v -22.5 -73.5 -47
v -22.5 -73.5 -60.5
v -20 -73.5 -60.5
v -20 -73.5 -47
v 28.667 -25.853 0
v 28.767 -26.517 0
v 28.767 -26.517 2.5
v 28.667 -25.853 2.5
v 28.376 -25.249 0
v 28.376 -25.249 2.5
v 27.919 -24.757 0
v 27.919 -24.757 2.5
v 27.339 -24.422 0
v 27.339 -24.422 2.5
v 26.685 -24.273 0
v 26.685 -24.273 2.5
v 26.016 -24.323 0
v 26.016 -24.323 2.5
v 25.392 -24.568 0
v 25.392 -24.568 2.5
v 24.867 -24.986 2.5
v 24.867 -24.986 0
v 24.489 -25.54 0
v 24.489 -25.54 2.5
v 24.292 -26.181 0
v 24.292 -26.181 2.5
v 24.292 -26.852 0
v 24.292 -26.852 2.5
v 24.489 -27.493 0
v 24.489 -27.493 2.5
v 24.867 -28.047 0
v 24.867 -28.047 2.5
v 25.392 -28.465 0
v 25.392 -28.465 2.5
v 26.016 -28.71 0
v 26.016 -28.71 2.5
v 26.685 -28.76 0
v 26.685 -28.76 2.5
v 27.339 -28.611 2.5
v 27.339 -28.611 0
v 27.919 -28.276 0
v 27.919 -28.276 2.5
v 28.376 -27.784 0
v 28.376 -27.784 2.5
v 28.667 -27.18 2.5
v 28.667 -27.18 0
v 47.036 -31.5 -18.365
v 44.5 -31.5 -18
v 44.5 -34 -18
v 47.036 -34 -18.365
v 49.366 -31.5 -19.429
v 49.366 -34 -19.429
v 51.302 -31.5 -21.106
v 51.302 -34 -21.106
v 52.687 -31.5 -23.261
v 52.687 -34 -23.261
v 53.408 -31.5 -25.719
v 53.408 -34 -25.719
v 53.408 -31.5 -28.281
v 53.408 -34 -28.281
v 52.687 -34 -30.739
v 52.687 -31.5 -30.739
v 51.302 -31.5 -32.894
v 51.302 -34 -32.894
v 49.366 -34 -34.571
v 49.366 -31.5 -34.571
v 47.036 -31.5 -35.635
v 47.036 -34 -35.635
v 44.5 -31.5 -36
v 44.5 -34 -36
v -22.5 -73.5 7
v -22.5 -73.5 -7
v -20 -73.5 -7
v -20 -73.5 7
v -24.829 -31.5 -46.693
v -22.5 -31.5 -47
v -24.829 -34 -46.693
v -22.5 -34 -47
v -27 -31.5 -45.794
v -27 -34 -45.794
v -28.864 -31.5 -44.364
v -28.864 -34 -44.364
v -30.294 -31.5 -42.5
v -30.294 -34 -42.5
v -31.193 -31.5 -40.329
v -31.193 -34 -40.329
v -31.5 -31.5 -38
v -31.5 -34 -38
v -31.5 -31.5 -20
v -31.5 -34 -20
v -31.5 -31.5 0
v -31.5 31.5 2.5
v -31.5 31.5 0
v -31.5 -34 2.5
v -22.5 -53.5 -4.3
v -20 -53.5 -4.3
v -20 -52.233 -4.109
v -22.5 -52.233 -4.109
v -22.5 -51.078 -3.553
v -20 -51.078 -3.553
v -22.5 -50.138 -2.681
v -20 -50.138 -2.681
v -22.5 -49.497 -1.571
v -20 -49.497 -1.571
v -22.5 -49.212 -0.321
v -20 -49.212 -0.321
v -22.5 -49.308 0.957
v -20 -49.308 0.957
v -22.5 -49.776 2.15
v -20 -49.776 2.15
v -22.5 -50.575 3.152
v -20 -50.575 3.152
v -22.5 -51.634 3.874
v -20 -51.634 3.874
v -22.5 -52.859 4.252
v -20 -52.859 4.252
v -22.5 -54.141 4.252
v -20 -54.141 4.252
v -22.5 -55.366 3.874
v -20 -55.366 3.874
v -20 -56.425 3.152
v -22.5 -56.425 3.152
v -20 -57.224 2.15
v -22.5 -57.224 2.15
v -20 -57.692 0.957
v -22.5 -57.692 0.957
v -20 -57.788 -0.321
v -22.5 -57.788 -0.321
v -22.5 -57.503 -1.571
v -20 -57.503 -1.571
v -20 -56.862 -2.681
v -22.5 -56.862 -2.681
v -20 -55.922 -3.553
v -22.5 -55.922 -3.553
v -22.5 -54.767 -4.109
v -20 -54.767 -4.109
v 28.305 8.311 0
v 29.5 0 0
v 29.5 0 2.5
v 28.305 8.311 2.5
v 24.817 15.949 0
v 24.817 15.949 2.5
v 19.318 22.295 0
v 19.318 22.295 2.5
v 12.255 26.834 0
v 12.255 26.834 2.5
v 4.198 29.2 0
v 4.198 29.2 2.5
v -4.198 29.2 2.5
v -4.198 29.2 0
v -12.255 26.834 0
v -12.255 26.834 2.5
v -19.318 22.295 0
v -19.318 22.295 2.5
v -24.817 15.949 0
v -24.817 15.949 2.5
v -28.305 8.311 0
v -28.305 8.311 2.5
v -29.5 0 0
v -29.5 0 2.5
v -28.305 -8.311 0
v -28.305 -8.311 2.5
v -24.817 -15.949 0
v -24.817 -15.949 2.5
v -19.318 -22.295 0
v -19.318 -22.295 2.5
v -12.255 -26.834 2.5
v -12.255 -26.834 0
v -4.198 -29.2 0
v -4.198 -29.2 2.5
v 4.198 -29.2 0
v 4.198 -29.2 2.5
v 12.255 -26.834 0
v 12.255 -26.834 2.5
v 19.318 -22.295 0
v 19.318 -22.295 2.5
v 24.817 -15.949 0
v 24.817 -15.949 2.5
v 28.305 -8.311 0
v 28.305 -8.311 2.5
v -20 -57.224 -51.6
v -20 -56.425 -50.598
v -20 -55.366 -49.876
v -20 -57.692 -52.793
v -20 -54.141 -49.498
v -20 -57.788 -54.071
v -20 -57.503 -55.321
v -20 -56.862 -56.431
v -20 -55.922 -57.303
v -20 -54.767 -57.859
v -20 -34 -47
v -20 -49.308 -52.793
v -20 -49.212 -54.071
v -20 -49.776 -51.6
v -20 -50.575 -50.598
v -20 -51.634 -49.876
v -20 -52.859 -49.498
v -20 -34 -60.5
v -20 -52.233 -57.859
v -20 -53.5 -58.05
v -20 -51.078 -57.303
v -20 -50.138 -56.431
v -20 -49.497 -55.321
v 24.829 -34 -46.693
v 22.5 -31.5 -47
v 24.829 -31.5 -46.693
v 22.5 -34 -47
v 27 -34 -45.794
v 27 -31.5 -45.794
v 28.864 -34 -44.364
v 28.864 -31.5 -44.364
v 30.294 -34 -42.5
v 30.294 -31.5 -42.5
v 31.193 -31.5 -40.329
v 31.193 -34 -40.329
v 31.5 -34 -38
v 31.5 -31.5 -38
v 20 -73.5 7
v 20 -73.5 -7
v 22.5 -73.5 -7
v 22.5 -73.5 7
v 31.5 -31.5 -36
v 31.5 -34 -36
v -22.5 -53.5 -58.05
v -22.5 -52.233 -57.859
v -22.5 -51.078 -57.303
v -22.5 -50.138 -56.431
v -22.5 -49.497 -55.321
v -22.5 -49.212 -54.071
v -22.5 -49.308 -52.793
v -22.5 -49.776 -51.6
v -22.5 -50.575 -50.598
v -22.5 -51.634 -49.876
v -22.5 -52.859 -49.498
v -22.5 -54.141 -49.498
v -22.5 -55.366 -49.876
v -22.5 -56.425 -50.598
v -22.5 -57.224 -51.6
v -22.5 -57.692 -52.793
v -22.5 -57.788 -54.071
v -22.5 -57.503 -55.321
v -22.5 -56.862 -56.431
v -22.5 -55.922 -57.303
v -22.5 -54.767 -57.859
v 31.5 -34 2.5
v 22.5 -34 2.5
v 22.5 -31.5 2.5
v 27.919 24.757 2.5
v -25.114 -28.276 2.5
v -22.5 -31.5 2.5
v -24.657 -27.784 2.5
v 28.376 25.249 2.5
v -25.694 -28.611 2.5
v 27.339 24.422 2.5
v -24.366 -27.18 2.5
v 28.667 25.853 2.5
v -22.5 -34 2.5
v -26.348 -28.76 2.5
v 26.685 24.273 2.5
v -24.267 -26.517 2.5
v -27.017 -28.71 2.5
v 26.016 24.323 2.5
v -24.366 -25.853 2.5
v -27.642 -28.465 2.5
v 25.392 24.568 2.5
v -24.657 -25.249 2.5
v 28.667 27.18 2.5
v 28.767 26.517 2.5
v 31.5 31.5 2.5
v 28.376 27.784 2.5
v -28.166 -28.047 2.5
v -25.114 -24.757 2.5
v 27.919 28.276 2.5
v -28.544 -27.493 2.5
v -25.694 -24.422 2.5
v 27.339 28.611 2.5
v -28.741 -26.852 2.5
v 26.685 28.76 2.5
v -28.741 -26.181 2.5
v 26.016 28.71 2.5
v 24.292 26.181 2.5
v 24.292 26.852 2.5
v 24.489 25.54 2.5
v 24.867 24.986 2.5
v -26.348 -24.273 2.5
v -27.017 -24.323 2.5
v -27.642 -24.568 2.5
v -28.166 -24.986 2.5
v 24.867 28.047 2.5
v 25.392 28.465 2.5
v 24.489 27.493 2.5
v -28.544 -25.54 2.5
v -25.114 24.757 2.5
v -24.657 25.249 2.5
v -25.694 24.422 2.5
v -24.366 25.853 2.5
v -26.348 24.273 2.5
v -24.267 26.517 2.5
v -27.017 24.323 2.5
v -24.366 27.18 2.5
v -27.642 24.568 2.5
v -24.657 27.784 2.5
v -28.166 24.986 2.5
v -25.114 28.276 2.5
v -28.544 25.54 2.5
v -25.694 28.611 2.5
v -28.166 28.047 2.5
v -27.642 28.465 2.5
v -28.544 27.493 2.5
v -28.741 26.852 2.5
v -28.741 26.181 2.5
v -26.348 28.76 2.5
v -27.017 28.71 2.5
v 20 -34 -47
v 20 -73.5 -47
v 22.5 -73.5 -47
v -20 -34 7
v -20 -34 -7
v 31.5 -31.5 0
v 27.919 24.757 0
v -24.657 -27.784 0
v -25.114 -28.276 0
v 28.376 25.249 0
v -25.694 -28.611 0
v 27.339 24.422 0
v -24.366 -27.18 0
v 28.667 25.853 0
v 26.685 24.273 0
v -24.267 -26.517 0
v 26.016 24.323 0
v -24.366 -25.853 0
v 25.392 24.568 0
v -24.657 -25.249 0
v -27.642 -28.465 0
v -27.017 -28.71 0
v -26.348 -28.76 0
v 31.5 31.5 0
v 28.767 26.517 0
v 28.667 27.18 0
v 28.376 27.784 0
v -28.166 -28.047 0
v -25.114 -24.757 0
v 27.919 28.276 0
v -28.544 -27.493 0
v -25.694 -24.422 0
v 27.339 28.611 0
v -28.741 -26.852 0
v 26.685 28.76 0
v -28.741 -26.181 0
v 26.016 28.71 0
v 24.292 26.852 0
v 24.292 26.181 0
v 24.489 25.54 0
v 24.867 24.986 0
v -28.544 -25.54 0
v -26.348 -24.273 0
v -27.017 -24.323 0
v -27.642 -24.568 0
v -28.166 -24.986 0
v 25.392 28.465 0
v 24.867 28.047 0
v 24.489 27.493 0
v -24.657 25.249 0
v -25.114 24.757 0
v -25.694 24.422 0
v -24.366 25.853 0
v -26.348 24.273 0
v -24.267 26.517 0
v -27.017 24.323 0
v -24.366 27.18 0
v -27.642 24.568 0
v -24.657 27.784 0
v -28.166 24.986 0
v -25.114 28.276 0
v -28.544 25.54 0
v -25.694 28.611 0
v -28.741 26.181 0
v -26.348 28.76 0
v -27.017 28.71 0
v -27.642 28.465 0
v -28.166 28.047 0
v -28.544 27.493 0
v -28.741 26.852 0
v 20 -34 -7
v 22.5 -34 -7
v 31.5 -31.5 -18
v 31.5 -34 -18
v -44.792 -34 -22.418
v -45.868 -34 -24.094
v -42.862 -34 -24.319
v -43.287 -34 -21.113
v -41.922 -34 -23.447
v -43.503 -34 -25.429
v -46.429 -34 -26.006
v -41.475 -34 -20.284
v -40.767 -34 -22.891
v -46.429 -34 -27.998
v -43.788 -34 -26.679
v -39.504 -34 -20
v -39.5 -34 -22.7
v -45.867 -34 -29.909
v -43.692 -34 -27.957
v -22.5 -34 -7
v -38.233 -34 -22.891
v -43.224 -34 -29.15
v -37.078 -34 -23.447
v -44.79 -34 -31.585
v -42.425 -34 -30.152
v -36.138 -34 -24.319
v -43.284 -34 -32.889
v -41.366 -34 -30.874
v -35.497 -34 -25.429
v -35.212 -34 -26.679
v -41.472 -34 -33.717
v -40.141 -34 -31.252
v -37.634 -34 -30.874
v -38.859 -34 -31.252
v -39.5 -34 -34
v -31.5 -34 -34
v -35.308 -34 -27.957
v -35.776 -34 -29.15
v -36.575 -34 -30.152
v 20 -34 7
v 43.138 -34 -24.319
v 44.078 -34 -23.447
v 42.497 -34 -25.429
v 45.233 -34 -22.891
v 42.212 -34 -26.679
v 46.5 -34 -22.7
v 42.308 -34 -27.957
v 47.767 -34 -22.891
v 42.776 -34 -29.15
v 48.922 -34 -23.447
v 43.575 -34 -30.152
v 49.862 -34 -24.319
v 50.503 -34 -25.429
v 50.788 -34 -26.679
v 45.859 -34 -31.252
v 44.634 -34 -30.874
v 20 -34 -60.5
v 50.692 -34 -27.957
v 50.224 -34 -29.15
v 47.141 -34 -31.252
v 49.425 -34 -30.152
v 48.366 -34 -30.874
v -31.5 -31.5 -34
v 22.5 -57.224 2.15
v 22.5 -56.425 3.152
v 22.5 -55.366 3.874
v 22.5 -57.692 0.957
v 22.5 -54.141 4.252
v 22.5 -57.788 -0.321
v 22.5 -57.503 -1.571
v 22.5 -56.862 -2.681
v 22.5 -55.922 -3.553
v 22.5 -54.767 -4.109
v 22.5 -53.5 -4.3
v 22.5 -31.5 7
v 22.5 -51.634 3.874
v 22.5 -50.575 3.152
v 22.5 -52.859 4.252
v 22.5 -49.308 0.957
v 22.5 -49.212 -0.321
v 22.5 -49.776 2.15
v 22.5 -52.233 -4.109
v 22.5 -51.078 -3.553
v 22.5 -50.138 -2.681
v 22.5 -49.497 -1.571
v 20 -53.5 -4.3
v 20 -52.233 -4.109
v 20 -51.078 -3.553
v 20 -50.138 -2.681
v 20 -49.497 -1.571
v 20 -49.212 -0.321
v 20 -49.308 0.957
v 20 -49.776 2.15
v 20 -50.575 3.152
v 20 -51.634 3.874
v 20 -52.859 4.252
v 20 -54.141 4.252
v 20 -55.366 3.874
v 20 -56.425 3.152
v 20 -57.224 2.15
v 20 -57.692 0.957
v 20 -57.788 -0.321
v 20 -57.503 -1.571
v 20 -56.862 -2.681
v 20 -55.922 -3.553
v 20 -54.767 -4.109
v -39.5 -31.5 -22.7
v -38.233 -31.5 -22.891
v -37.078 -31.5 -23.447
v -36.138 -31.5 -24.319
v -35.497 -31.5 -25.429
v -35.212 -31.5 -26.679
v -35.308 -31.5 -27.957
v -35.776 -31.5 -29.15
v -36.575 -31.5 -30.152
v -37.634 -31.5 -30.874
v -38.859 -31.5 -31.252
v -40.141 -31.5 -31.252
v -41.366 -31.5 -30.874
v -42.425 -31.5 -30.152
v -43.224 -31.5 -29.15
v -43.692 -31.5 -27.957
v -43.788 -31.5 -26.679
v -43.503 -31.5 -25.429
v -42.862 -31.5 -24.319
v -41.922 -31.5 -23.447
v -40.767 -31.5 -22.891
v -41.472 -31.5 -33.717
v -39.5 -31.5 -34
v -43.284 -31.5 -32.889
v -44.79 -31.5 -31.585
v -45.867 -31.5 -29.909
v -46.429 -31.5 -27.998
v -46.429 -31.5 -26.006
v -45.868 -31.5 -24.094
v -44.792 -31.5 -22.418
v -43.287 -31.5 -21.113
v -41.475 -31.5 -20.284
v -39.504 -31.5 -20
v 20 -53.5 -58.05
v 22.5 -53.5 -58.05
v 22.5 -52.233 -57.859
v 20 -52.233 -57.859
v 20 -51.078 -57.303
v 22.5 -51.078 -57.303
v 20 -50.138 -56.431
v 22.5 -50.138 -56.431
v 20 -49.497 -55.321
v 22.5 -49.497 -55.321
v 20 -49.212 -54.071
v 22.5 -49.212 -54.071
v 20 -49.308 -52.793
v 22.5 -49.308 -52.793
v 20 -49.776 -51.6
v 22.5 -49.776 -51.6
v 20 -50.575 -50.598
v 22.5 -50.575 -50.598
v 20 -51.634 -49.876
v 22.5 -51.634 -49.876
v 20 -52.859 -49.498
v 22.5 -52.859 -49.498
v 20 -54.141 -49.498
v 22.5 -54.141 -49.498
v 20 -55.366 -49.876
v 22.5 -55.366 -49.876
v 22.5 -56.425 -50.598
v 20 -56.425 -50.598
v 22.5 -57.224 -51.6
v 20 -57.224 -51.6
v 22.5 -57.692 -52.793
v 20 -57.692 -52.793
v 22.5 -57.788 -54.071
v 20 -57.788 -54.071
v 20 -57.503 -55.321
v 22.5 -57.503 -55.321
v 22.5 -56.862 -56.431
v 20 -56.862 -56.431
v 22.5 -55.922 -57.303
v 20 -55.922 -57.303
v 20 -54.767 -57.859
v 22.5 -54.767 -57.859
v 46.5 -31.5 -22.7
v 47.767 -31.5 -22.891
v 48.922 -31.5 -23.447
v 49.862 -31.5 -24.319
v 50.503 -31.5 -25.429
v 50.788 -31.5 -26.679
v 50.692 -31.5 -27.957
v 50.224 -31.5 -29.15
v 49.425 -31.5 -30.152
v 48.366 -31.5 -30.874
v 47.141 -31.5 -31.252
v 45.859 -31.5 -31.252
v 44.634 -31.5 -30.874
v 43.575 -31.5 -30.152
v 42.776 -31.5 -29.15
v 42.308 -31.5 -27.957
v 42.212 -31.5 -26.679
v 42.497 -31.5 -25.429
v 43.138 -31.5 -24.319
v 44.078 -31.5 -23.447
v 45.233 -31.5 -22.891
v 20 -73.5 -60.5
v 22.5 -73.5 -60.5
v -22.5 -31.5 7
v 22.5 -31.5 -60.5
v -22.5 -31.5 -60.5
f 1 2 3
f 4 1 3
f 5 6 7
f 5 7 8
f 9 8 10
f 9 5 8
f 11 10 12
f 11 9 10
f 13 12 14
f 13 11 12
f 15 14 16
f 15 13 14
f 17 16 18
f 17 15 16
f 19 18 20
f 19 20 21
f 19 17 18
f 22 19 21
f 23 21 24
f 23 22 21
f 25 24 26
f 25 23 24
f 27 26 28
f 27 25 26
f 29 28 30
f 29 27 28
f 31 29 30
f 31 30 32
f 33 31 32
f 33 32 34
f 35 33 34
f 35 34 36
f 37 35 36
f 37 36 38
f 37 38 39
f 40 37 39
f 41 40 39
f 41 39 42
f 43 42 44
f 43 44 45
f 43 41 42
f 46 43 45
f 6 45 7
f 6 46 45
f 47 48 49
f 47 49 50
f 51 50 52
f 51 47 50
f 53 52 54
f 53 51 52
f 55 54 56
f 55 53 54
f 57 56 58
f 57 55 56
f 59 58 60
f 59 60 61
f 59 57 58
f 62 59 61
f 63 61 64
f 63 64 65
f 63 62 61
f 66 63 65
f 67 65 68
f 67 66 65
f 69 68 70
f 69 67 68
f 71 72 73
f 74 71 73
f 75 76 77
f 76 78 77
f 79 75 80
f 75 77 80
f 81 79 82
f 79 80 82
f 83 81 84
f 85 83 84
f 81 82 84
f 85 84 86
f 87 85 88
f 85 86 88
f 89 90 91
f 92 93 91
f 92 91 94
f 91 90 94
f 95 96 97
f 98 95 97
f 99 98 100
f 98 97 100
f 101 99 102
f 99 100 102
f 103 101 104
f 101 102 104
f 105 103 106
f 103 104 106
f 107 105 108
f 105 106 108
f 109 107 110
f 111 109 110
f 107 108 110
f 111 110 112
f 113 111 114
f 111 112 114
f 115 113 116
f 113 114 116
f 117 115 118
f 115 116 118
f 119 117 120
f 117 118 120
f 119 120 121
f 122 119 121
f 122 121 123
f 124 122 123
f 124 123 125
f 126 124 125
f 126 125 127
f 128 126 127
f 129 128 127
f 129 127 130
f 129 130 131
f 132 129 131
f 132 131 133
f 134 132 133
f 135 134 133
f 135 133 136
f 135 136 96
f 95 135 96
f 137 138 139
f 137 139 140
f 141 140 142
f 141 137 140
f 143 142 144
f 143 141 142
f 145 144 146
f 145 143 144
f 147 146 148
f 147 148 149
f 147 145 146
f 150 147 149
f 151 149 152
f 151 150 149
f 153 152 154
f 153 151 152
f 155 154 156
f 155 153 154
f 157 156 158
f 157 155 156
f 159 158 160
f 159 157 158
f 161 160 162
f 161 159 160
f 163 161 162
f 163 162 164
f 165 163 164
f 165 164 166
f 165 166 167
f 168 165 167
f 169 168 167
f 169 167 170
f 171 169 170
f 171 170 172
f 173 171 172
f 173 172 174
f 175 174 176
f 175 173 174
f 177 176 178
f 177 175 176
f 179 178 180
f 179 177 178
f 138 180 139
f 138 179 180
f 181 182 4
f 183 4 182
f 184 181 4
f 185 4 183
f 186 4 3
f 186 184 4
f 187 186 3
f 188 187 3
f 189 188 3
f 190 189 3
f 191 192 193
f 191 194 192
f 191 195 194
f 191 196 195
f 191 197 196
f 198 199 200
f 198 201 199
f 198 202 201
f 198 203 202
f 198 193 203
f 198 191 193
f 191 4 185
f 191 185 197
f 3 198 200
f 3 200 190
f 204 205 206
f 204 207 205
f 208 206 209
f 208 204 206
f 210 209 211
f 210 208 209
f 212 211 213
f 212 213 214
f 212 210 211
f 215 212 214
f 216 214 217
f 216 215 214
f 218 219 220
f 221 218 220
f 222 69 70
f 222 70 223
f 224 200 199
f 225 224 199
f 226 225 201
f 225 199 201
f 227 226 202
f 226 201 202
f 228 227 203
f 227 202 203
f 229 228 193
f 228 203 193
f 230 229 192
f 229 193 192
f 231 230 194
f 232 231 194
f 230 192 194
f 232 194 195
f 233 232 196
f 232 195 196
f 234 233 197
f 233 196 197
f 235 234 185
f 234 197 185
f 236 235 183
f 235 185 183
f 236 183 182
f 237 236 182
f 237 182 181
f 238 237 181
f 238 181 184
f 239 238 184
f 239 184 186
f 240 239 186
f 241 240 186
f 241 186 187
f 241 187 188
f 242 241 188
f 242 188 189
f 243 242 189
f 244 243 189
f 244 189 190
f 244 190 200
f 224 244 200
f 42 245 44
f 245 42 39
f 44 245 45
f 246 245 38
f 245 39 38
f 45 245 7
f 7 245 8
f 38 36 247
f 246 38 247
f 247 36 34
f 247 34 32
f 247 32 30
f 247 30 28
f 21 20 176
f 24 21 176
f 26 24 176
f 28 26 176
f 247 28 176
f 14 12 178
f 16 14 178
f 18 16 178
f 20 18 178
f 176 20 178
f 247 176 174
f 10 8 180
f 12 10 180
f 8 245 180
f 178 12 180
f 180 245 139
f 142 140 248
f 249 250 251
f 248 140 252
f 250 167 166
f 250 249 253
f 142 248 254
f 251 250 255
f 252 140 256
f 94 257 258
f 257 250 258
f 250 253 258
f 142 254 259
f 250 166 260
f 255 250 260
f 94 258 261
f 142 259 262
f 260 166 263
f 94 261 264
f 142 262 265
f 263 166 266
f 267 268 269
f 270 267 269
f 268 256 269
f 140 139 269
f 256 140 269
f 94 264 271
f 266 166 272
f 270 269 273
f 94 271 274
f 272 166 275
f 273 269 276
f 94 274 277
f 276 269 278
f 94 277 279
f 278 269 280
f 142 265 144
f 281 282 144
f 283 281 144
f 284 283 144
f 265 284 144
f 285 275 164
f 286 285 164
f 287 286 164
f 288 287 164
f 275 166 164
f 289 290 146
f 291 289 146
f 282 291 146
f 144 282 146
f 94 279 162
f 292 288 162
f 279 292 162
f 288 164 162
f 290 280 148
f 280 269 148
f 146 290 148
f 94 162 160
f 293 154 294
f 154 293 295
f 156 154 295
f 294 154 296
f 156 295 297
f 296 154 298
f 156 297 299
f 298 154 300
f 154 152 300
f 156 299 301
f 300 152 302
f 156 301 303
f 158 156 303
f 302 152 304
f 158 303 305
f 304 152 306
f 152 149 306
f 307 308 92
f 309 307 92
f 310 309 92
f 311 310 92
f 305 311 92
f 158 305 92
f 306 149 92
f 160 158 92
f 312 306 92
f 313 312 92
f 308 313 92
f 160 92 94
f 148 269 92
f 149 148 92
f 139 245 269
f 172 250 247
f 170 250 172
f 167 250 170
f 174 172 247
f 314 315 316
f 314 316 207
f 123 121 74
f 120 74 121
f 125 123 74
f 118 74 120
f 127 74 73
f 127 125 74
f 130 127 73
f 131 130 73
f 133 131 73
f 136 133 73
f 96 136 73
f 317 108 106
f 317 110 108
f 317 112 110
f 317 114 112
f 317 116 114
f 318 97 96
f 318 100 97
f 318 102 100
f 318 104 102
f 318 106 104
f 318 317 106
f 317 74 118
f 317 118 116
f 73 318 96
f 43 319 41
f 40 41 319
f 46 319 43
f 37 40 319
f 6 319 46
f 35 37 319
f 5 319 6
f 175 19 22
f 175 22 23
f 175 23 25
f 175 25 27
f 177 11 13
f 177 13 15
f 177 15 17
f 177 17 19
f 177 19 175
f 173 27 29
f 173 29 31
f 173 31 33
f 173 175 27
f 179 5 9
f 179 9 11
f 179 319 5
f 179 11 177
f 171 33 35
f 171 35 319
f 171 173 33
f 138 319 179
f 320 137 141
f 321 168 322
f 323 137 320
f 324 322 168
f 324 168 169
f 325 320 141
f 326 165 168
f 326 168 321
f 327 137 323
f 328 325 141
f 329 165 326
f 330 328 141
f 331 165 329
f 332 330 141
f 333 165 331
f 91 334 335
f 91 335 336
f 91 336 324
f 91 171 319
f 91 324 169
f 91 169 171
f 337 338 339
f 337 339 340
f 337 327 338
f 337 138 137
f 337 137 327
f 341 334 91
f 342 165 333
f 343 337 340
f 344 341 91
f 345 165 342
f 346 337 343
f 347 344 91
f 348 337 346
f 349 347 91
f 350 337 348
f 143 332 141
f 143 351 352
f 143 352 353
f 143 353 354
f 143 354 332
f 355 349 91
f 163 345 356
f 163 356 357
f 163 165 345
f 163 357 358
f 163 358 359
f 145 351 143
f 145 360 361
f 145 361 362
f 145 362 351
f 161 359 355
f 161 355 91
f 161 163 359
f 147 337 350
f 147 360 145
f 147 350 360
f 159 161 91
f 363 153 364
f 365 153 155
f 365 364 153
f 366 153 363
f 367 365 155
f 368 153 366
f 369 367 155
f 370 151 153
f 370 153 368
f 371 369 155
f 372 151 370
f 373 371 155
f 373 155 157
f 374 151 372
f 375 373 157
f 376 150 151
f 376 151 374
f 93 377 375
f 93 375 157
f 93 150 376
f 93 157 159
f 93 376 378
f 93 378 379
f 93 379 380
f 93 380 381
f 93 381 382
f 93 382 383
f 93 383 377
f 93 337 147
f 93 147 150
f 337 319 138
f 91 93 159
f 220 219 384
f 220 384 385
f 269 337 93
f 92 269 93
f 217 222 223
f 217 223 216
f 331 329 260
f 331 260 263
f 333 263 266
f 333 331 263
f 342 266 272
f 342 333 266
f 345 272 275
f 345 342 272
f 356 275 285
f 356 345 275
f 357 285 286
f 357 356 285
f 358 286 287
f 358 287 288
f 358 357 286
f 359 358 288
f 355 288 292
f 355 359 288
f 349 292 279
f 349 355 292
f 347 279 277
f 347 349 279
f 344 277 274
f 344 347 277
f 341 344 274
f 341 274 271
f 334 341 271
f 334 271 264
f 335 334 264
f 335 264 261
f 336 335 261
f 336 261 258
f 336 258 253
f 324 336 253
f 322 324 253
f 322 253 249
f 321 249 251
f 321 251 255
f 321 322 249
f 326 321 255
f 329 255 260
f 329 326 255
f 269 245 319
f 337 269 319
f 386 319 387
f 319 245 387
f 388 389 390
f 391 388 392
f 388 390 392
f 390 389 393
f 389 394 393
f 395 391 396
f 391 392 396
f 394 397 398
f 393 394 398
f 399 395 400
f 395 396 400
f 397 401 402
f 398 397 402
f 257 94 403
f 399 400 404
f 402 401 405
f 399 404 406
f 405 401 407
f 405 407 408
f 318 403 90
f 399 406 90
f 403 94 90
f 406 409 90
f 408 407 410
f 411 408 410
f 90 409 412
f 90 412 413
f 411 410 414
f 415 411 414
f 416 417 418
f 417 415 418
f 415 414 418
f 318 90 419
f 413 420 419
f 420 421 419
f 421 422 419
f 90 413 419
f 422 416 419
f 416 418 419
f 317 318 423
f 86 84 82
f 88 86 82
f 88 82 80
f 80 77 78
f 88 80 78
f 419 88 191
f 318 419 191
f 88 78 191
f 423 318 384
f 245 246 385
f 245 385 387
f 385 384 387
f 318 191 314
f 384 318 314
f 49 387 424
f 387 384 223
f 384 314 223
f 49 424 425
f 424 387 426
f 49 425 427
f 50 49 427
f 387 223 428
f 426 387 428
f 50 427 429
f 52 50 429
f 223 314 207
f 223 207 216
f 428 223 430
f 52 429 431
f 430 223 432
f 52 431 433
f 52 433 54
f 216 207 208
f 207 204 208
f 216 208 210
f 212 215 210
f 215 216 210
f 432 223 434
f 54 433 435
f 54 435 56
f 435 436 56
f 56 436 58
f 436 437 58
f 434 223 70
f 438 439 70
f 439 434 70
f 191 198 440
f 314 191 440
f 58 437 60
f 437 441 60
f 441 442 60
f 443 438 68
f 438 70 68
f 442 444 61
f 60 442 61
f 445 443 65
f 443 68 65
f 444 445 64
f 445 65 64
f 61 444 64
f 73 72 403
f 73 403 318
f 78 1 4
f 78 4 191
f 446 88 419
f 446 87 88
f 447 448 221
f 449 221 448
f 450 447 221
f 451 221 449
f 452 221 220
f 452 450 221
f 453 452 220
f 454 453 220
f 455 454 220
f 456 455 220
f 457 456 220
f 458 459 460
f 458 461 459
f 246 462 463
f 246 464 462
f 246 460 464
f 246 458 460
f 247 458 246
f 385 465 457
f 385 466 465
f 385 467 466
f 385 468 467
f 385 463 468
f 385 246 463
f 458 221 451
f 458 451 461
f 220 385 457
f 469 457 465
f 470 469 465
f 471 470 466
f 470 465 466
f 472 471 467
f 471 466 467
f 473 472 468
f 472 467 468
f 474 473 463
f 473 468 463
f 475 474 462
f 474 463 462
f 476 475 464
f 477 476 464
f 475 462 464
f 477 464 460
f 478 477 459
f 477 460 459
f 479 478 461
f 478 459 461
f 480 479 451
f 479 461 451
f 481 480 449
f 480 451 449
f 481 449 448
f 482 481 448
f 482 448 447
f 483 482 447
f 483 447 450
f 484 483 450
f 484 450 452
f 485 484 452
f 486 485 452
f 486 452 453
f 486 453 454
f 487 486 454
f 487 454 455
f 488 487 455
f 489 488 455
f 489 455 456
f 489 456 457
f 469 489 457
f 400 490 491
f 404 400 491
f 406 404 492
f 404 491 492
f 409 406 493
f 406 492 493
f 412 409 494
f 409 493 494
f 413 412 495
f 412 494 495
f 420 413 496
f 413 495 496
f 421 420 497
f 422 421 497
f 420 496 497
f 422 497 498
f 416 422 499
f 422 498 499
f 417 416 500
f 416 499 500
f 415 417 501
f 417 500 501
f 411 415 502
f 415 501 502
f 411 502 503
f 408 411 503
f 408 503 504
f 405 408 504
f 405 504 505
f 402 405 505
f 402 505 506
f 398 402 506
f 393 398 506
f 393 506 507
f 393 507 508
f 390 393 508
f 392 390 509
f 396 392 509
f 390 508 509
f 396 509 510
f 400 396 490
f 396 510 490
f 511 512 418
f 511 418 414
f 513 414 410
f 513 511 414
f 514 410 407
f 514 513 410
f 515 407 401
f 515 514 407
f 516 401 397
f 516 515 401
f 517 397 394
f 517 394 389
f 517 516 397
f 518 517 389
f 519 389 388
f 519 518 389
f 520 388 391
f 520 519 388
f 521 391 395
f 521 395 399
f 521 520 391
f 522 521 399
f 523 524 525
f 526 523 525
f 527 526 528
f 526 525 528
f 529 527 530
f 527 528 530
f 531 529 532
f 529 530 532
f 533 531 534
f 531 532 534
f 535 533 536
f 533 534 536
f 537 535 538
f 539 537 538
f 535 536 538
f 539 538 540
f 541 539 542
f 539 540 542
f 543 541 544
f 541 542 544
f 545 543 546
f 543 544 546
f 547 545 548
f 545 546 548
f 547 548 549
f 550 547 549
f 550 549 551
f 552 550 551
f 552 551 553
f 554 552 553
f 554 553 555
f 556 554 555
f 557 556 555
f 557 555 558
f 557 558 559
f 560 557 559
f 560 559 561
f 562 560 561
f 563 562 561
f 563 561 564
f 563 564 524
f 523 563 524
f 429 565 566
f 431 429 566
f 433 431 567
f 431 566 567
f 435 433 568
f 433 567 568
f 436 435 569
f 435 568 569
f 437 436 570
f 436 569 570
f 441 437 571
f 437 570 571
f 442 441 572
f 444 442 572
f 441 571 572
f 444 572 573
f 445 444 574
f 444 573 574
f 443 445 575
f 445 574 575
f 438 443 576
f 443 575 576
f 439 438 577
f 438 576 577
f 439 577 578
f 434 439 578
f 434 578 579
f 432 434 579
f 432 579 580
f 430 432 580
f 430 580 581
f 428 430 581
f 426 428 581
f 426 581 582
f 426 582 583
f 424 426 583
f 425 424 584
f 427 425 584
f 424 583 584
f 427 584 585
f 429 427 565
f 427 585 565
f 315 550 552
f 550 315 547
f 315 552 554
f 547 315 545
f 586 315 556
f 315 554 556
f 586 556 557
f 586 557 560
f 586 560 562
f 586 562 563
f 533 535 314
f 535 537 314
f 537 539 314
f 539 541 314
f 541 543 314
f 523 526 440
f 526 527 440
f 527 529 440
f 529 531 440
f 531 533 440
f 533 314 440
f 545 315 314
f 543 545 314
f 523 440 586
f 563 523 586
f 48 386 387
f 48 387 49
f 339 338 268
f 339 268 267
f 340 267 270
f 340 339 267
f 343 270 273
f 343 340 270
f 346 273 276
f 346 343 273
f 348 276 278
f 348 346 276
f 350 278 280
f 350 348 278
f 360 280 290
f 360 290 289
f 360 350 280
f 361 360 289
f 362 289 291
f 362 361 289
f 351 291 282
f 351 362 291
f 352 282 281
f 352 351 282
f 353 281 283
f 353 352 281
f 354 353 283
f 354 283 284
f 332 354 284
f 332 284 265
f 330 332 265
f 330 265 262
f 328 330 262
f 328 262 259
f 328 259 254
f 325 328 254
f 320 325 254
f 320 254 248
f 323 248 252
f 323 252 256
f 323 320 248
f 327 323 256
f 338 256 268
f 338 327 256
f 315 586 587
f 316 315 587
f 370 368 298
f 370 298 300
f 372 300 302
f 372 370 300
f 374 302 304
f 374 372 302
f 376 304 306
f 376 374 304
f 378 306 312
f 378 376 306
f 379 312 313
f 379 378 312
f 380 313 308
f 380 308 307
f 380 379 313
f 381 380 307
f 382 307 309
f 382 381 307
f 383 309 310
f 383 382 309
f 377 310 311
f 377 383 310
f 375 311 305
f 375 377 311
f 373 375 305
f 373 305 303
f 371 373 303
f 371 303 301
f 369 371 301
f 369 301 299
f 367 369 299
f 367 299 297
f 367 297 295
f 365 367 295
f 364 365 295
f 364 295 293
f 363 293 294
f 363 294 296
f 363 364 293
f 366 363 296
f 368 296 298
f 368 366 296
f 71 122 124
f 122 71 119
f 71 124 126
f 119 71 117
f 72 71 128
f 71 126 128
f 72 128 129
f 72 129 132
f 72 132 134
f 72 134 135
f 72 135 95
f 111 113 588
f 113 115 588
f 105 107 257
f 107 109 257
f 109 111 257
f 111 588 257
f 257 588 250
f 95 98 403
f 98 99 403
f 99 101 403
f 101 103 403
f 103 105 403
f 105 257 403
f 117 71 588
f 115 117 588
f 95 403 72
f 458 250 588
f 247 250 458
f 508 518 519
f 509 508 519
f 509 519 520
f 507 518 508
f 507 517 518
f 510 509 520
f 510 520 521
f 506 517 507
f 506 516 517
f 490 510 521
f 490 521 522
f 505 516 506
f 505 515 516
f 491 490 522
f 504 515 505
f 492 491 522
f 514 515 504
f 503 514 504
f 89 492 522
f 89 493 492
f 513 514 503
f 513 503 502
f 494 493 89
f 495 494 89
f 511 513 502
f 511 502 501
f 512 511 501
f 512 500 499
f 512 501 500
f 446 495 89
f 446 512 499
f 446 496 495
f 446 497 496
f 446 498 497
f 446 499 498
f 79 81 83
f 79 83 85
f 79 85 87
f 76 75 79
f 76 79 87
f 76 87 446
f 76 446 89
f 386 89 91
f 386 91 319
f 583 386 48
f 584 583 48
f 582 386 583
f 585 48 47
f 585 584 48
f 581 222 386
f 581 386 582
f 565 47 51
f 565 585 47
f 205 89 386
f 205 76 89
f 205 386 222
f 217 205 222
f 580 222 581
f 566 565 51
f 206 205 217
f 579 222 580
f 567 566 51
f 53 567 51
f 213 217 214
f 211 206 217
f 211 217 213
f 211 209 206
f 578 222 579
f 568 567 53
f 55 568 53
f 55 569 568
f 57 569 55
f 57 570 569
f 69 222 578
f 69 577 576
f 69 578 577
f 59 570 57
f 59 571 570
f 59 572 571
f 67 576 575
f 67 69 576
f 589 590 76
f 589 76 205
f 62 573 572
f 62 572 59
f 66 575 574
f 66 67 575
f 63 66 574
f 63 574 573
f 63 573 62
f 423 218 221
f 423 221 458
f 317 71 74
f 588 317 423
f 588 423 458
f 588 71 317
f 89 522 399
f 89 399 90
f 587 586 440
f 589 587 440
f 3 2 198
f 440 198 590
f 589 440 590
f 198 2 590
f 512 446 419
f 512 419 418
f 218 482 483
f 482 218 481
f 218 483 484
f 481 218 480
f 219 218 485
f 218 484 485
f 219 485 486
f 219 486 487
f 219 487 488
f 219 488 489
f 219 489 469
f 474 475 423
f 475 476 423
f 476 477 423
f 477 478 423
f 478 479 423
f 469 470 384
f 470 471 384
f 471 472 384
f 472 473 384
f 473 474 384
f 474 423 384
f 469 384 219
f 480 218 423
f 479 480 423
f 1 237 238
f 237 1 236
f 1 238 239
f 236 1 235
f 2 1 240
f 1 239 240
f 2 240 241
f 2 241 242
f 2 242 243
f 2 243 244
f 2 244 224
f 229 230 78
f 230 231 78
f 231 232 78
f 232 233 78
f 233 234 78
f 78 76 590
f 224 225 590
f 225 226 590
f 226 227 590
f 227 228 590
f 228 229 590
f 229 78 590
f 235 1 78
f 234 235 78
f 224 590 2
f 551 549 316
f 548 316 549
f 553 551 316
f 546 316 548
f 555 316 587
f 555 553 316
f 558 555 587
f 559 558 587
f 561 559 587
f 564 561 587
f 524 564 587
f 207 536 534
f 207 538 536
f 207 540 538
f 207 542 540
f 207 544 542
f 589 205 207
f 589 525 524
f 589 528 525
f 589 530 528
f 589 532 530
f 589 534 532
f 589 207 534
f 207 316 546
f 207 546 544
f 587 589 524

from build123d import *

# Parameters (mm, degrees)
SKETCH_1_R           = 29.5
SKETCH_1_R_2         = 2.25
EXTRUDE_1_DEPTH      = 2.5
EXTRUDE_2_DEPTH      = 2.5
SKETCH_3_W           = 2.5
SKETCH_3_H           = 20.5
SKETCH_3_H_2         = 29.5
EXTRUDE_3_DEPTH      = 42
SKETCH_4_W           = 15.5
SKETCH_4_H           = 42
SKETCH_4_W_2         = 6
CUT_EXTRUDE_1_DEPTH  = 60
SKETCH_5_R           = 4.3
EXTRUDE_4_DEPTH      = 2.5
CUT_EXTRUDE_9_DEPTH  = 122.813381989
EXTRUDE_6_DEPTH      = 2.5
SKETCH_14_R          = 4.3
CUT_EXTRUDE_10_DEPTH = 118.573381341
FILLET_3_R           = 9


with BuildPart() as part:
    # 草图1 → 凸台-拉伸1 (new body)
    with BuildSketch(Plane.XY):
        Polygon((0, 31.5), (31.5, 31.5), (31.5, -34), (-31.5, -34), (-31.5, 31.5), align=None)
        Circle(SKETCH_1_R, mode=Mode.SUBTRACT)
        with Locations((-26.516504294, 26.516504294)):
            Circle(SKETCH_1_R_2, mode=Mode.SUBTRACT)
        with Locations((26.516504294, 26.516504294)):
            Circle(SKETCH_1_R_2, mode=Mode.SUBTRACT)
        with Locations((26.516504294, -26.516504294)):
            Circle(SKETCH_1_R_2, mode=Mode.SUBTRACT)
        with Locations((-26.516504294, -26.516504294)):
            Circle(SKETCH_1_R_2, mode=Mode.SUBTRACT)
    extrude(amount=EXTRUDE_1_DEPTH)

    # 草图2 → 凸台-拉伸2 (add)
    with BuildSketch(Plane(origin=(0, -34, 0), x_dir=(1, 0, 0), z_dir=(0, 1, 0))):
        Polygon((-31.5, 46.5), (-31.5, -2.5), (-20, -2.5), (-20, -22.5), (20, -22.5), (20, -2.5), (31.5, -2.5), (31.5, 46.5), (20, 46.5), (20, 66.5), (-20, 66.5), (-20, 46.5), align=None)
    extrude(amount=EXTRUDE_2_DEPTH)

    # 草图3 → 凸台-拉伸3 (add)
    with BuildSketch(Plane(origin=(0, -31.5, 0), x_dir=(1, 0, 0), z_dir=(0, 1, 0))):
        with Locations((21.25, 56.25)):
            Rectangle(SKETCH_3_W, SKETCH_3_H)
        with Locations((-21.25, 56.25)):
            Rectangle(SKETCH_3_W, SKETCH_3_H)
        with Locations((-21.25, -7.75)):
            Rectangle(SKETCH_3_W, SKETCH_3_H_2)
        with Locations((21.25, -7.75)):
            Rectangle(SKETCH_3_W, SKETCH_3_H_2)
    extrude(amount=-EXTRUDE_3_DEPTH)

    # 草图4 → 切除-拉伸1 (cut)
    with BuildSketch(Plane.ZY.offset(22.5)):
        with Locations((14.75, -52.5)):
            Rectangle(SKETCH_4_W, SKETCH_4_H)
        with Locations((-63.5, -52.5)):
            Rectangle(SKETCH_4_W_2, SKETCH_4_H)
    extrude(amount=-CUT_EXTRUDE_1_DEPTH, mode=Mode.SUBTRACT)

    # 草图5 → 凸台-拉伸4 (add)
    # profile 1 of 2: a face of its own
    with BuildSketch(Plane(origin=(0, -31.5, 0), x_dir=(1, 0, 0), z_dir=(0, 1, 0))):
        with BuildLine():
            Line((-31.5, 33.999994356), (-39.5, 33.999994356))
            ThreePointArc((-39.5, 33.999994356), (-46.499999777, 27.00176014), (-39.503531569, 19.999995247))
            Line((-39.503531569, 19.999995247), (-31.5, 19.999995247))
            Line((-31.5, 19.999995247), (-31.5, 33.999994356))
        make_face()
        with Locations(Location((-39.5, 26.999994356, 0), (0, 0, 270))):
            Circle(SKETCH_5_R, mode=Mode.SUBTRACT)
    # profile 2 of 2: a face of its own
    with BuildSketch(Plane(origin=(0, -31.5, 0), x_dir=(1, 0, 0), z_dir=(0, 1, 0))):
        with BuildLine():
            Line((44.500000207, 35.999994356), (31.5, 35.999994356))
            Line((31.5, 35.999994356), (31.5, 26.5))
            Line((31.5, 26.5), (31.5, 17.999994356))
            Line((31.5, 17.999994356), (44.500000207, 17.999994356))
            ThreePointArc((44.500000207, 17.999994356), (53.500000207, 26.999994356), (44.500000207, 35.999994356))
        make_face()
        with Locations(Location((46.5, 26.999994356, 0), (0, 0, 270))):
            Circle(SKETCH_5_R, mode=Mode.SUBTRACT)
    extrude(amount=-EXTRUDE_4_DEPTH)

    # 草图12 → 切除-拉伸9 (cut, through all)
    with BuildSketch(Plane.ZY.offset(22.5)):
        Polygon((-46, -73.5), (-47, -73.5), (-47, -31.5), (-46.5, -31.5), (-46, -31.5), align=None)
    extrude(amount=-CUT_EXTRUDE_9_DEPTH, mode=Mode.SUBTRACT)


with BuildPart() as cut_extrude_9_piece_1:
    # of the separate pieces the step leaves, piece 1, a body of its own (cut_extrude_9_pieces)
    add(part.part.solids().sort_by_distance((31.5, 31.5, 0))[0])



with BuildPart() as cut_extrude_9_piece_2:
    # of the separate pieces the step leaves, piece 2, a body of its own (cut_extrude_9_pieces)
    add(part.part.solids().sort_by_distance((-22.5, -31.5, -60.5))[0])


with BuildPart() as cut_extrude_9_piece_1_1:
    add(cut_extrude_9_piece_1.part)

    add(cut_extrude_9_piece_2.part)  # 凸台-拉伸6 merges 切除-拉伸9 piece 2
    # 草图13 → 凸台-拉伸6 (add)
    with BuildSketch(Plane(origin=(0, -31.5, 0), x_dir=(1, 0, 0), z_dir=(0, 1, 0))):
        Polygon((31.5, 46.5), (31.5, 47), (22.5, 47), (-22.5, 47), (-31.5, 47), (-31.5, 46.5), (-22.5, 46.5), (-22.5, 46), (31.5, 46), align=None)
    extrude(amount=-EXTRUDE_6_DEPTH)

    # 草图14 → 切除-拉伸10 (cut, through all)
    with BuildSketch(Plane(origin=(22.5, 0, 0), x_dir=(0, 0, -1), z_dir=(1, 0, 0))):
        with Locations((0, -53.5)):
            Circle(SKETCH_14_R)
        with Locations((53.75, -53.5)):
            Circle(SKETCH_14_R)
    extrude(amount=-CUT_EXTRUDE_10_DEPTH, mode=Mode.SUBTRACT)

    # 圆角3
    fillet_3_edges = [cut_extrude_9_piece_1_1.edges().sort_by_distance(p)[0] for p in [
        (-31.5, -32.75, -47),
        (31.5, -32.75, -47),
    ]]
    fillet(fillet_3_edges, radius=FILLET_3_R - 0.0001)  # a hair under: the kernel refuses the full size


solid = cut_extrude_9_piece_1_1.part
